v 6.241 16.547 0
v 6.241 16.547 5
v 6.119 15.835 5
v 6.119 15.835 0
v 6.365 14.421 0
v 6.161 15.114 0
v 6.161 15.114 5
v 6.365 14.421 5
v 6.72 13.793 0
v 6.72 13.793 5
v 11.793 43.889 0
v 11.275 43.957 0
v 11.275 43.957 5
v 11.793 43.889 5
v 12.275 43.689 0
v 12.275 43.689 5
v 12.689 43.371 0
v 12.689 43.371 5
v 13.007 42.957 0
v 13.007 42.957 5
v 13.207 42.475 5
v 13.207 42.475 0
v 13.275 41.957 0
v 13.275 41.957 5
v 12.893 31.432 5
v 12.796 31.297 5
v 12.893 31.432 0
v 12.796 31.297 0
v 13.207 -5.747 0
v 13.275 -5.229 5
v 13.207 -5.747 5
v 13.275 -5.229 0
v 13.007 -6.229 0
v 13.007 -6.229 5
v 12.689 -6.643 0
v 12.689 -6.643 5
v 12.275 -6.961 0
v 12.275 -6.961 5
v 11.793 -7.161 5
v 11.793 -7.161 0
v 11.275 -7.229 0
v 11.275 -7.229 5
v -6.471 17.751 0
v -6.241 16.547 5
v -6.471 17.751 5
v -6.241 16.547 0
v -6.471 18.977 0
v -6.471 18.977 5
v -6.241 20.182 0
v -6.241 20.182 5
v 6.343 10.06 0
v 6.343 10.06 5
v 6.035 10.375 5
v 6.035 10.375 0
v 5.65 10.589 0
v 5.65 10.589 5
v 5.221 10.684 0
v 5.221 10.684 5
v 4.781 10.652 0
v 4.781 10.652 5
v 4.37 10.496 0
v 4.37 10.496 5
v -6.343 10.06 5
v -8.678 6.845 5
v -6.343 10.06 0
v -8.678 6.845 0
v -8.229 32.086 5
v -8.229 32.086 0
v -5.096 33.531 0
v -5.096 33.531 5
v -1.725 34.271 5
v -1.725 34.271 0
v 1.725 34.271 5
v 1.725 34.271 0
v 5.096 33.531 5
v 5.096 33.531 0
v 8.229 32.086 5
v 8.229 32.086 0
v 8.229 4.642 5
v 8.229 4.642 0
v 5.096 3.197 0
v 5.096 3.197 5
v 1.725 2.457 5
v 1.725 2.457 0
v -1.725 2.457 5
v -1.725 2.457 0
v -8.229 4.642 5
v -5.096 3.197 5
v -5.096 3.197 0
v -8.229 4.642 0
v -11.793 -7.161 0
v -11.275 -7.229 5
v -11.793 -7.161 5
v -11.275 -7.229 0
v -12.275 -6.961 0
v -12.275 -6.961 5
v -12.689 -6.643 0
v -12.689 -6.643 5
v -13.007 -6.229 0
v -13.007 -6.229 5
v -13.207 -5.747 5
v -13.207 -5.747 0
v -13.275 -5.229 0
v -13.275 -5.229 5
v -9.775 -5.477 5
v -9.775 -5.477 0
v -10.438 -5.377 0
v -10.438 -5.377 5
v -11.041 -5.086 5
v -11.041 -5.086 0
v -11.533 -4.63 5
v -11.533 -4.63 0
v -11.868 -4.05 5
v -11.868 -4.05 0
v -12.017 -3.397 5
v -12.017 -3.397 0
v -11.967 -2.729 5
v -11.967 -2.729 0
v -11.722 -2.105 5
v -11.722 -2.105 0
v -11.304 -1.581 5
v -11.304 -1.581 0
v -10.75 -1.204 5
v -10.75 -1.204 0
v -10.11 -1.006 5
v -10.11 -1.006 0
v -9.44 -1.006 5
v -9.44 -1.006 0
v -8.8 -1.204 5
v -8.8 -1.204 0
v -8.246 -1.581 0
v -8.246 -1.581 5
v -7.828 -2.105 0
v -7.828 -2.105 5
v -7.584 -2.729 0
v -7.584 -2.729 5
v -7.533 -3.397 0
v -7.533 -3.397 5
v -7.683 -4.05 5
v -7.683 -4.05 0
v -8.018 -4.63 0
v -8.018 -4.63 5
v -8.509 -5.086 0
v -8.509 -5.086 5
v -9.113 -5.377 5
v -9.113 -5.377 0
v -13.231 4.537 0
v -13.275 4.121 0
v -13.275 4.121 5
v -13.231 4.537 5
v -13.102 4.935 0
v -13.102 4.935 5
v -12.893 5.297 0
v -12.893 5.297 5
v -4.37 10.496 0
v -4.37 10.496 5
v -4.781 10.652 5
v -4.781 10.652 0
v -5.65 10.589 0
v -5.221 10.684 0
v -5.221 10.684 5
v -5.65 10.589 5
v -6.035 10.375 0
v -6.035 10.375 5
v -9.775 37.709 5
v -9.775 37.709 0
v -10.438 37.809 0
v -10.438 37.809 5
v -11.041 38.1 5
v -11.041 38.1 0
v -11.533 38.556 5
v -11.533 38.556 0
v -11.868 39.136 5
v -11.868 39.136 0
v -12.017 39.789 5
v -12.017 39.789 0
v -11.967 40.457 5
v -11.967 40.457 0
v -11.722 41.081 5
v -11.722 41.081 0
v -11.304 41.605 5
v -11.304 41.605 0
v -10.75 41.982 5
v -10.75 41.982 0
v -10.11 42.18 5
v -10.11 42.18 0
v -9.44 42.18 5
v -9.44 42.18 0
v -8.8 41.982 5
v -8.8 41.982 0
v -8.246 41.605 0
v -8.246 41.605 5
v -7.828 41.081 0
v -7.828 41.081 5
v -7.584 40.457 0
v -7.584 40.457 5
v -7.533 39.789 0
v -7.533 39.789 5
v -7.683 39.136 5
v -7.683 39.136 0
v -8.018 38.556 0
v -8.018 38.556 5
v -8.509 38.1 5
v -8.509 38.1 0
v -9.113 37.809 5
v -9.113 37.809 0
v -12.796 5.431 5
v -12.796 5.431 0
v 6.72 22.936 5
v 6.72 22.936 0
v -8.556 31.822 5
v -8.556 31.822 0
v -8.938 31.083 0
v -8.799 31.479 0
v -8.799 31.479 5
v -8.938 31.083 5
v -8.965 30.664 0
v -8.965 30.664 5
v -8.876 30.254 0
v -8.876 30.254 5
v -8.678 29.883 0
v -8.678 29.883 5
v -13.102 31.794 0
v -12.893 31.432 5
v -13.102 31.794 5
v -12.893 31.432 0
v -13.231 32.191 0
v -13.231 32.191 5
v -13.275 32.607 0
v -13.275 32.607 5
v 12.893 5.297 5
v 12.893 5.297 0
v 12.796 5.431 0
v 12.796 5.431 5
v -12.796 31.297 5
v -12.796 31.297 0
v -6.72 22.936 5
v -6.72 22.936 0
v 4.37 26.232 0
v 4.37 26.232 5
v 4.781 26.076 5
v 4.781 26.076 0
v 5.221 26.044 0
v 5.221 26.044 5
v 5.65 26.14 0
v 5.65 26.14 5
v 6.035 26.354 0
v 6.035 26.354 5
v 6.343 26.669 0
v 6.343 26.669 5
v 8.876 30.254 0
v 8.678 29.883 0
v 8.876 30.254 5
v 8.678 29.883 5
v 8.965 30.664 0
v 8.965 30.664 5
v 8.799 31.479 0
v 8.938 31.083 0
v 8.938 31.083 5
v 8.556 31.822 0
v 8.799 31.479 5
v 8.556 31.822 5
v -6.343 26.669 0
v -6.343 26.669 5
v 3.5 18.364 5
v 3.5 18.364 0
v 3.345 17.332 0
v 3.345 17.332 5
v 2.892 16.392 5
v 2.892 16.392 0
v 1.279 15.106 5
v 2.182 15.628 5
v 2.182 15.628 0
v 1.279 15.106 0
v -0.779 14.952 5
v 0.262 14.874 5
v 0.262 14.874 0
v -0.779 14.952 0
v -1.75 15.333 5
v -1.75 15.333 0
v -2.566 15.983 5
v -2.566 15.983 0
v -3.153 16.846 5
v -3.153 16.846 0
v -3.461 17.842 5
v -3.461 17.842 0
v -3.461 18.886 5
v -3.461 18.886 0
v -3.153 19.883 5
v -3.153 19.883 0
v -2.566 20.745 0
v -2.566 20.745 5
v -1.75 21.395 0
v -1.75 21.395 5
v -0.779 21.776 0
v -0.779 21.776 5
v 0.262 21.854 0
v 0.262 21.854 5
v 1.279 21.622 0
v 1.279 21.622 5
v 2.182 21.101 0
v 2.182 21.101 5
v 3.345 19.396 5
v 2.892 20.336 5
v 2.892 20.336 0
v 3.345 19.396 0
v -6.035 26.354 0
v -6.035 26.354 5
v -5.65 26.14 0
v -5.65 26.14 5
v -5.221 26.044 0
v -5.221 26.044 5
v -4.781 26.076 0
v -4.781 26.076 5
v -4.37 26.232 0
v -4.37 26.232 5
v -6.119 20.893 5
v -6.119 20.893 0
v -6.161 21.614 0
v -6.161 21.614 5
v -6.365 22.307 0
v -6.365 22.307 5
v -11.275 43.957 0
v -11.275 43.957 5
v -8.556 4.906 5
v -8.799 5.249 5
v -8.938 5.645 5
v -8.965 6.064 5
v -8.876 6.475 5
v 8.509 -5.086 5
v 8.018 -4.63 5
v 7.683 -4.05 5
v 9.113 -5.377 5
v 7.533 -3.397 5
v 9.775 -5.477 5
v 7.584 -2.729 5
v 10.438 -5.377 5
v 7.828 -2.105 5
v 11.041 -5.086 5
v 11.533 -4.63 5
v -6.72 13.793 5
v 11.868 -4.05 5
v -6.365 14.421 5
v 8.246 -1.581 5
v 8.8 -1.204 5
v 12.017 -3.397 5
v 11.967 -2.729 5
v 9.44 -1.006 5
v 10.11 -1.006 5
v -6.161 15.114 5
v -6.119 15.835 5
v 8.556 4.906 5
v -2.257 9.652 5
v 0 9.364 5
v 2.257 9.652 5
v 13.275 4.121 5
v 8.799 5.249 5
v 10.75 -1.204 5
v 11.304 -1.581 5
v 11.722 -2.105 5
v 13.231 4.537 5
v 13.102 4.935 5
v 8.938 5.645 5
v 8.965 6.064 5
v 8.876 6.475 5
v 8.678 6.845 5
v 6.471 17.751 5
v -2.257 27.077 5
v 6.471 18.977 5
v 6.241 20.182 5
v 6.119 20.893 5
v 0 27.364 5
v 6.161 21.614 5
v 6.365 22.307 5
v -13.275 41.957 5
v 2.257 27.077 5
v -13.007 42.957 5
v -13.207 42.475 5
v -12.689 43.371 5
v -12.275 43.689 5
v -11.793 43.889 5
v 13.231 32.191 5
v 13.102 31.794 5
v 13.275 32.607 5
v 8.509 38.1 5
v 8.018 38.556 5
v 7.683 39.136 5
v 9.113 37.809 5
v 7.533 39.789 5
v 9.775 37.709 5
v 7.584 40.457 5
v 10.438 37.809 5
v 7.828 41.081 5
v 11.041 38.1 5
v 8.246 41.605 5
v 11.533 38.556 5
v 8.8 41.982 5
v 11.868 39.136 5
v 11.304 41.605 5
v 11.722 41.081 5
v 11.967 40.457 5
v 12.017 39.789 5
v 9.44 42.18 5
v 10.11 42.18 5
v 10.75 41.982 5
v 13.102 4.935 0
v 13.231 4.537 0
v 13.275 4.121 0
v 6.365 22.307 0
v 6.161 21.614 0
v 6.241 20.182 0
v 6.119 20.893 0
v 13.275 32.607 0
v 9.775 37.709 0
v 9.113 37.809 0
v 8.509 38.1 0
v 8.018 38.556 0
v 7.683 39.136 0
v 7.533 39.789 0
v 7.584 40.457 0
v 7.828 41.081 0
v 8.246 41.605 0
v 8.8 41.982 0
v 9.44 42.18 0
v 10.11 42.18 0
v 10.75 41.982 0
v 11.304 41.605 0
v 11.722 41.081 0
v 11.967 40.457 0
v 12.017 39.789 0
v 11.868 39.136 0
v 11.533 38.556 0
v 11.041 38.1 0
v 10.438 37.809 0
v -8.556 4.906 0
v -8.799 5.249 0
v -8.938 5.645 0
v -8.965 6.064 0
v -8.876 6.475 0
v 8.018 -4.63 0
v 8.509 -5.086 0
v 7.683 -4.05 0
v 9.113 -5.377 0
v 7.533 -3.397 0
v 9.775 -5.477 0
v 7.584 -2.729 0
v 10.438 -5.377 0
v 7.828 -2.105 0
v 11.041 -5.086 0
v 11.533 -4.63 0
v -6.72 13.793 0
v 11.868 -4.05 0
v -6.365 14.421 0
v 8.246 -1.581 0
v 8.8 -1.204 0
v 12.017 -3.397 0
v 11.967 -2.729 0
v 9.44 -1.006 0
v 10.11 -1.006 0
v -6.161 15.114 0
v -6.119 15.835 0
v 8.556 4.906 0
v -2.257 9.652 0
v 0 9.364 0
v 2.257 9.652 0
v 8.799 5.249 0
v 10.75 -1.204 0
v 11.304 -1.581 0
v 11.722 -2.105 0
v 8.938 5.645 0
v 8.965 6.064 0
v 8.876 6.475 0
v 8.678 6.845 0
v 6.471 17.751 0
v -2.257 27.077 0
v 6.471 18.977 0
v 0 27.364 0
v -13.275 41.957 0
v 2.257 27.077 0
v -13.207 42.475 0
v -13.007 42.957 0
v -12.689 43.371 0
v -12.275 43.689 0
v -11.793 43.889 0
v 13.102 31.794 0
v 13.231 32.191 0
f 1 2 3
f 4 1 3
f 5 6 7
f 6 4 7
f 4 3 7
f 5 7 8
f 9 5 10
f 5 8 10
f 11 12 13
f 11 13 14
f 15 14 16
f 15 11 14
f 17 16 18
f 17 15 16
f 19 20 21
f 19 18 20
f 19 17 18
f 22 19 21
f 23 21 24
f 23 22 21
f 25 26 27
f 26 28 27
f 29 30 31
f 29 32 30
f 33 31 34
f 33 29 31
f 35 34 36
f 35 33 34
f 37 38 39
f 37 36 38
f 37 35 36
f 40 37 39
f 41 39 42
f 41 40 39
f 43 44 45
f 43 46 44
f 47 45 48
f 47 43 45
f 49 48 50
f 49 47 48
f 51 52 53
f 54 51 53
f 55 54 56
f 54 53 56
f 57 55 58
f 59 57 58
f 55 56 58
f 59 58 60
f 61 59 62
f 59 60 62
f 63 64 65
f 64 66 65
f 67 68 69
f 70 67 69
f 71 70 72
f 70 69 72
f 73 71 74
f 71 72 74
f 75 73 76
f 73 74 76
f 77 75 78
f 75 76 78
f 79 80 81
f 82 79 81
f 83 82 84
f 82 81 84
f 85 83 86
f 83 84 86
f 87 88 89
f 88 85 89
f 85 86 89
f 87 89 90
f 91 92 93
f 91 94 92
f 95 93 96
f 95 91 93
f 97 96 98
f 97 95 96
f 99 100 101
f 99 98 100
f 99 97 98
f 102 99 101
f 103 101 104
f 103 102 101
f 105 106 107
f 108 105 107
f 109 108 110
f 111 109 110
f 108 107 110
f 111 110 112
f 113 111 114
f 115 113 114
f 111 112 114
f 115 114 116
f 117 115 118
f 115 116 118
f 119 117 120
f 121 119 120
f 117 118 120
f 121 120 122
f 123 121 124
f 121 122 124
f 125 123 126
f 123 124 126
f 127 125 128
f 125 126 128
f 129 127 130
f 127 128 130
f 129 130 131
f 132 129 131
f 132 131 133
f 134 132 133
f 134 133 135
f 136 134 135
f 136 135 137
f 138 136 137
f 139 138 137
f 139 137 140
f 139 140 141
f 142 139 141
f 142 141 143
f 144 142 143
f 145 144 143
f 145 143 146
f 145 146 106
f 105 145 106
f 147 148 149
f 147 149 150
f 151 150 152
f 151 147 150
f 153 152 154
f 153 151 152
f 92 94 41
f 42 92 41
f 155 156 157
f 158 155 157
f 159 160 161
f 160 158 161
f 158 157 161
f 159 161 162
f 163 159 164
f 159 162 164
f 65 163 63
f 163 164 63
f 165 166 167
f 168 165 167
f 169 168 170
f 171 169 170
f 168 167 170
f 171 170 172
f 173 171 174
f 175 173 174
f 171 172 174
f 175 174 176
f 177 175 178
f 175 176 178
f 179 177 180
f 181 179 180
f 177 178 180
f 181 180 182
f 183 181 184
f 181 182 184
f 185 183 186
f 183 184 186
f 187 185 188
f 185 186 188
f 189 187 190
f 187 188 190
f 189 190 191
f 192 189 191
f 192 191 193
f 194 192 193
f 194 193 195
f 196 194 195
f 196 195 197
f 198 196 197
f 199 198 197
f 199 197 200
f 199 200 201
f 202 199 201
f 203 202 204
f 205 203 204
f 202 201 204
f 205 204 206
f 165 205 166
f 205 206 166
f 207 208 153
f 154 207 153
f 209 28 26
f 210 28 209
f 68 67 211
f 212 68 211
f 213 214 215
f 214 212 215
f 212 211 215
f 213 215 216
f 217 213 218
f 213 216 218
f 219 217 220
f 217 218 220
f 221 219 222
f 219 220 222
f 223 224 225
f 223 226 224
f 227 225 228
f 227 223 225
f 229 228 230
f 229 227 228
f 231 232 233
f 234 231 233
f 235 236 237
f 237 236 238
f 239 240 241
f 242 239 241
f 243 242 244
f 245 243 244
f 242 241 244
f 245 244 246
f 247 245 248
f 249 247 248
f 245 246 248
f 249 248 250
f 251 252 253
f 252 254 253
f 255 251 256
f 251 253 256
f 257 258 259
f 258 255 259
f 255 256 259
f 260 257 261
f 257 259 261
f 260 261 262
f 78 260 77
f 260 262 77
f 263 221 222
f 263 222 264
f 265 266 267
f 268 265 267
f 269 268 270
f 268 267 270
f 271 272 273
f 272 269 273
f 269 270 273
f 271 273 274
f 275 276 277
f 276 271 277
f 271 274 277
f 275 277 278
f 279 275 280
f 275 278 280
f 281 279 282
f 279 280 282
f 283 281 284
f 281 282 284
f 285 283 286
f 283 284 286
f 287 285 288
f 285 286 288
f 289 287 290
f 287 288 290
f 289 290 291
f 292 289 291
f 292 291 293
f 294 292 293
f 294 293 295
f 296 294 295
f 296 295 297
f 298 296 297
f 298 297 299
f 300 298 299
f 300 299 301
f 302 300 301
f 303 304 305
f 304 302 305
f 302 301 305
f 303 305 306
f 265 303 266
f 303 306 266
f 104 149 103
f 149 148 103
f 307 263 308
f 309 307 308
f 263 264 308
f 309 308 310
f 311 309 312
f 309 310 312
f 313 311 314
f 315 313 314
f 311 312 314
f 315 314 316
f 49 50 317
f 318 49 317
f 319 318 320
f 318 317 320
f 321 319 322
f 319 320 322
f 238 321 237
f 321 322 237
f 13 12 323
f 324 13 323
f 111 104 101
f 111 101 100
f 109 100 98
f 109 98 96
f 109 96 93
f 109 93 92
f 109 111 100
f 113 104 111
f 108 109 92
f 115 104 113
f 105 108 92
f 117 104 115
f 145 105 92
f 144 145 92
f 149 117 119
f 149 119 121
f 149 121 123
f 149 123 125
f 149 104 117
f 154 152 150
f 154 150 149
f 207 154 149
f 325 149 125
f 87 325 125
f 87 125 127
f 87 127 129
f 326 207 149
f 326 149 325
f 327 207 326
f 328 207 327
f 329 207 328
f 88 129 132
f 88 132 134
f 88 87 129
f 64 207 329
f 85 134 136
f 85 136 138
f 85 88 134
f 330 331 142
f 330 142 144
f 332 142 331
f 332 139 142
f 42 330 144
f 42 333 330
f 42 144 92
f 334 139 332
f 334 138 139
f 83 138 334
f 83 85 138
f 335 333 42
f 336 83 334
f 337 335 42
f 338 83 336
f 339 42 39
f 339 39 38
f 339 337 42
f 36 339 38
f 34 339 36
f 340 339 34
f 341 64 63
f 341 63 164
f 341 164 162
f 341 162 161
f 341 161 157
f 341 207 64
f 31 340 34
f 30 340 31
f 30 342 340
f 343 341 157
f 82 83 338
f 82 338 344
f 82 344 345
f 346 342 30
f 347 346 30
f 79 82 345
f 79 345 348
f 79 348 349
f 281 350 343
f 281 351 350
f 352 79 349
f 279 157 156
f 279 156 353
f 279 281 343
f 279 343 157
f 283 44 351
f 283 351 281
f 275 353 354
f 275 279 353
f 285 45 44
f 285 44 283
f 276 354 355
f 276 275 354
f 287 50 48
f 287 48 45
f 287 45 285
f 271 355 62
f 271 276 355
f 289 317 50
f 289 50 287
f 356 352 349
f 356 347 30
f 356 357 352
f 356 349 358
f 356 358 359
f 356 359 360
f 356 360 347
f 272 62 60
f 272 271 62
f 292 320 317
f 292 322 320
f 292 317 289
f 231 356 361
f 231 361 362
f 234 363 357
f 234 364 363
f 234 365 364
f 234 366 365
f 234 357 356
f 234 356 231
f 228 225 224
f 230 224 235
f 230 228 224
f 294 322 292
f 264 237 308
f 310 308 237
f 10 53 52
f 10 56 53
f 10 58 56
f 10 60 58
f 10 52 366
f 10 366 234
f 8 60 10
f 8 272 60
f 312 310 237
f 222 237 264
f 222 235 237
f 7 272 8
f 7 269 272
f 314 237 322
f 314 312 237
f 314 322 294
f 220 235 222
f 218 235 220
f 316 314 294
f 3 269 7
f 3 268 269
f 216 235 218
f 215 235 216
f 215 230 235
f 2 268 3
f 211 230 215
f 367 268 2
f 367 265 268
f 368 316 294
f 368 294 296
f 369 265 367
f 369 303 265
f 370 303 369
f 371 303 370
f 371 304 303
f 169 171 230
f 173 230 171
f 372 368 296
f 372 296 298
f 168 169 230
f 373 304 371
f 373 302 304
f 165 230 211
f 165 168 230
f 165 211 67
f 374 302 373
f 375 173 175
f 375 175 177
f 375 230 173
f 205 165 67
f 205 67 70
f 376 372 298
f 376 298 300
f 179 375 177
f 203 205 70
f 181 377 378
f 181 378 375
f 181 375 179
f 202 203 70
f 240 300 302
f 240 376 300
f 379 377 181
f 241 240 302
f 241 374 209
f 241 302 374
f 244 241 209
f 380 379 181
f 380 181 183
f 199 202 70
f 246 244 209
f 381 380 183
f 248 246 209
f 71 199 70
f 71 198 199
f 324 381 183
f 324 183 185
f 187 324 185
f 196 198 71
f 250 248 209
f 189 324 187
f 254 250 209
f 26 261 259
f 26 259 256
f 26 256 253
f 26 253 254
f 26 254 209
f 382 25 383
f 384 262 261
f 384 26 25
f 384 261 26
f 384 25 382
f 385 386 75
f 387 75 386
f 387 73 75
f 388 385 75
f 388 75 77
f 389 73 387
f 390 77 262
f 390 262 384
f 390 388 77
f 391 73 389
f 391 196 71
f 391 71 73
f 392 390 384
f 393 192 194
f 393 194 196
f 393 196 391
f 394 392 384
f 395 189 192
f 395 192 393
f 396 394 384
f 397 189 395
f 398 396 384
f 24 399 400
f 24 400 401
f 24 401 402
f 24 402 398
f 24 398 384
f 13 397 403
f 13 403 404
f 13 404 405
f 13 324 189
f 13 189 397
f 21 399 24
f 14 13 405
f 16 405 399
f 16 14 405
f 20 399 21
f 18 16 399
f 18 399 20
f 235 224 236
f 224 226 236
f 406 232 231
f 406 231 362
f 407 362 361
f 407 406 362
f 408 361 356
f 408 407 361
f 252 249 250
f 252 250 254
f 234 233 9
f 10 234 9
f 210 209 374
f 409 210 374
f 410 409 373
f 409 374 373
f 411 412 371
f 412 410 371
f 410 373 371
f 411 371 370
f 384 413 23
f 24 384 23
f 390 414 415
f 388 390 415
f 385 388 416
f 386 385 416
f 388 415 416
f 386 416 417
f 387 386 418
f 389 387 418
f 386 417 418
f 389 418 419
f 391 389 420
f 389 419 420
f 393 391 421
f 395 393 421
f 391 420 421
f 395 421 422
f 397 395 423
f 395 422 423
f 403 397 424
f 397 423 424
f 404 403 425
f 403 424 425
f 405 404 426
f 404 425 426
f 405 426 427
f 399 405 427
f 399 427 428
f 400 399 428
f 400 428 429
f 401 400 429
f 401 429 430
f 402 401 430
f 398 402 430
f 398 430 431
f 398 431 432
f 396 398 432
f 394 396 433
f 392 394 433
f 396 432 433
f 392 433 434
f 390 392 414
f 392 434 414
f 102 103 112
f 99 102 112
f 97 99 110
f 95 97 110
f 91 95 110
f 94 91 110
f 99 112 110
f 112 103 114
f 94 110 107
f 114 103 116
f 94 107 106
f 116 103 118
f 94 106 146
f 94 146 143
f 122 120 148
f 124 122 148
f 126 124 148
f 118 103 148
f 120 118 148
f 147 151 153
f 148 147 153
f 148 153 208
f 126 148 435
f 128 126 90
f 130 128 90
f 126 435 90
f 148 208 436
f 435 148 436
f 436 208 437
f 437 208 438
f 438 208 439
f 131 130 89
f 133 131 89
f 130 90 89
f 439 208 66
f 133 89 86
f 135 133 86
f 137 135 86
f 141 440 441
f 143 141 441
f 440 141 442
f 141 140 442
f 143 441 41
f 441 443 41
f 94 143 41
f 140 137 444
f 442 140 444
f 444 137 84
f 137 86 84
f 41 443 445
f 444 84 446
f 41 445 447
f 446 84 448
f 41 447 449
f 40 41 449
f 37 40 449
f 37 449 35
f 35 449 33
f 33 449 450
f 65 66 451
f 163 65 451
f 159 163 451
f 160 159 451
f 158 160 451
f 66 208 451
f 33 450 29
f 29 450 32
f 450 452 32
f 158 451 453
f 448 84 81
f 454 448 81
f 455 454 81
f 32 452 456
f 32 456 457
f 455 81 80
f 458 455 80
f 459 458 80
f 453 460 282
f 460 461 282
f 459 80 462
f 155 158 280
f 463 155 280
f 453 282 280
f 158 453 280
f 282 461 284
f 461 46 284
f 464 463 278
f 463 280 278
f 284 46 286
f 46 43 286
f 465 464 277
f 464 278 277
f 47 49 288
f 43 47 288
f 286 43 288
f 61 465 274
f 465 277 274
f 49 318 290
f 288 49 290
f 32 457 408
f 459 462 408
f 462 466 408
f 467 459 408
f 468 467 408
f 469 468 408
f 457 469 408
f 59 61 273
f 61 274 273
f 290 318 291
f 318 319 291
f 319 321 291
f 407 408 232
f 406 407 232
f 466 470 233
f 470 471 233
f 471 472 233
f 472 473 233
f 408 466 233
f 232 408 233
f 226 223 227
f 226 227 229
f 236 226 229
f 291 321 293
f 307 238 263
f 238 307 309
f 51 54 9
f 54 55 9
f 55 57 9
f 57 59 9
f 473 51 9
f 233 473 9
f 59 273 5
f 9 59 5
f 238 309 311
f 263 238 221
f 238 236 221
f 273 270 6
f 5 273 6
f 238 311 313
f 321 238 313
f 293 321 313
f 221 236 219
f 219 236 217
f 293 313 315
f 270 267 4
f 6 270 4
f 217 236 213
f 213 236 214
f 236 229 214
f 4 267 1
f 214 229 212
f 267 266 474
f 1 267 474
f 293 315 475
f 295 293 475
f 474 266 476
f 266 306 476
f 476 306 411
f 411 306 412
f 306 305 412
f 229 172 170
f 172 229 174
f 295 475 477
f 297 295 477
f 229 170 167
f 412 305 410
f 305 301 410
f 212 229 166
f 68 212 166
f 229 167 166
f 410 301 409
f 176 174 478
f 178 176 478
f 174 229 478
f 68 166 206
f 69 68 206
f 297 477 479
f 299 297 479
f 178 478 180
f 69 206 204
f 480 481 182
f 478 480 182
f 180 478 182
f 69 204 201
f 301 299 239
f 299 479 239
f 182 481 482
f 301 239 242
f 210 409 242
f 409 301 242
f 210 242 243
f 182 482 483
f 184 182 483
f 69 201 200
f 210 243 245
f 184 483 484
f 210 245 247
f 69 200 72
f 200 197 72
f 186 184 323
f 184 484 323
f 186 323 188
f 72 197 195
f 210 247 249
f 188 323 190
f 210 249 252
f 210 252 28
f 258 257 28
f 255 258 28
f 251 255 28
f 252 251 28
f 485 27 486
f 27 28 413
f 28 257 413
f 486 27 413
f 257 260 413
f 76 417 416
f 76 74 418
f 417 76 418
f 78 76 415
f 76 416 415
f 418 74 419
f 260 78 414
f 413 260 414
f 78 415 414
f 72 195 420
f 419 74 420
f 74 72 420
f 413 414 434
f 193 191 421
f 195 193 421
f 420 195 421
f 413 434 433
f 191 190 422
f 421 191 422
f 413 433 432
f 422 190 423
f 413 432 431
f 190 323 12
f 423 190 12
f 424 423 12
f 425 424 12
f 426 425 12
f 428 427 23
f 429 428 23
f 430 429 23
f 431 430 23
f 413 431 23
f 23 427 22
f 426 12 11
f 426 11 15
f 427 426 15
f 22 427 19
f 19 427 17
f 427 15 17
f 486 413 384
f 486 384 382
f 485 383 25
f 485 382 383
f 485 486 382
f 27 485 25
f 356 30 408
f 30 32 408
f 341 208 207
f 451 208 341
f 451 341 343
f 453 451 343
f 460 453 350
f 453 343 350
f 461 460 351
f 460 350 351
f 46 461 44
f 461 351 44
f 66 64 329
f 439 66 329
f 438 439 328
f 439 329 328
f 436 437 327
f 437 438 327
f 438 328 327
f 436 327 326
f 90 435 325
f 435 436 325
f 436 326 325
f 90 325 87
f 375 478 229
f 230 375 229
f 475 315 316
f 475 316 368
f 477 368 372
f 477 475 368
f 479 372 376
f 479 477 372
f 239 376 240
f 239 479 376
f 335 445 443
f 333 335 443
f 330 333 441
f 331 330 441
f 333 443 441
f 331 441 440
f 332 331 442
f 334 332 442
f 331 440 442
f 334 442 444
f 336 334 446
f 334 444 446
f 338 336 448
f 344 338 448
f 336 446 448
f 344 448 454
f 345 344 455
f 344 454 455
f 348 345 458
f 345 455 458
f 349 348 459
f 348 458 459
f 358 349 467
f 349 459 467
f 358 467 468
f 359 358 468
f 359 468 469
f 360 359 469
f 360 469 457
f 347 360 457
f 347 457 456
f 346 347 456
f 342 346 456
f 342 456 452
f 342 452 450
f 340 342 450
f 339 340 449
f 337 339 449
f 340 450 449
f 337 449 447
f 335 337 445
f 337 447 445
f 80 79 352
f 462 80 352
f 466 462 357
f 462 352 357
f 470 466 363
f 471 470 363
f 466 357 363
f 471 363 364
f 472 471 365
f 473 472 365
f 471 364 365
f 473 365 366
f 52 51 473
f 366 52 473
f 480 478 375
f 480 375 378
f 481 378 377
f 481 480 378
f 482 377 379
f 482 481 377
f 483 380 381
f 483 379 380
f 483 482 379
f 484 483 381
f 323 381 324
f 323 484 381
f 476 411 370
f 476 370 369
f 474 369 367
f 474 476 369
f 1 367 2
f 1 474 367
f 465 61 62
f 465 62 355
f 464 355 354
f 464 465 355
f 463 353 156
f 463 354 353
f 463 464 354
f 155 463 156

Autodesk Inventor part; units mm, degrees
ref_plane "YZ Plane" through (0, 0, 0) normal (1, 0, 0) x (0, 1, 0)
ref_plane "XZ Plane" through (0, 0, 0) normal (0, 1, 0) x (-1, 0, 0)
ref_plane "XY Plane" through (0, 0, 0) normal (0, 0, 1) x (1, 0, 0)
sketch "Sketch1" plane through (0, 0, 0) normal (0, 0, 1) x (1, 0, 0)
  circle A0 centre (9.7751, -3.2289) radius 1.621 projected
  circle A1 centre (-9.7751, -3.2289) radius 1.621 projected
  line L0 (-11.2751, -7.2289) -> (11.2751, -7.2289) projected
  line L1 (13.2751, -5.2289) -> (13.2751, 4.1213) projected
  line L2 (12.8932, 5.2968) -> (12.7957, 5.4309) projected
  line L3 (-12.7957, 5.4309) -> (-12.8932, 5.2968) projected
  line L4 (-13.2751, 4.1213) -> (-13.2751, -5.2289) projected
  circle A2 centre (-9.7751, 39.9572) radius 1.621 projected
  circle A3 centre (9.7751, 39.9572) radius 1.621 projected
  line L5 (11.2751, 43.9572) -> (-11.2751, 43.9572) projected
  line L6 (-13.2751, 41.9572) -> (-13.2751, 32.607) projected
  line L7 (-12.8932, 31.4315) -> (-12.7957, 31.2974) projected
  line L8 (12.7957, 31.2974) -> (12.8932, 31.4315) projected
  line L9 (13.2751, 32.607) -> (13.2751, 41.9572) projected
  line L10 (13.2751, -7.2289) -> (-13.2751, -7.2289)
  line L11 (-13.2751, -7.2289) -> (-13.2751, 43.9572)
  line L12 (-13.2751, 43.9572) -> (13.2751, 43.9572)
  line L13 (13.2751, 43.9572) -> (13.2751, -7.2289)
  circle A4 centre (0, 18.3641) radius 3.5
  circle A5 centre (0, 18.3641) radius 6.5
  line L14 (13.2751, 31.9572) -> (5.6866, 21.5125)
  line L15 (13.2751, 4.7711) -> (5.6866, 15.2158)
  line L16 (-13.2751, 4.7711) -> (-5.6866, 15.2158)
  line L17 (-13.2751, 31.9572) -> (-5.6866, 21.5125)
  arc A6 (-11.4894, 7.2289) -> (11.4894, 7.2289) centre (0, 18.3641) ccw
  arc A7 (11.4894, 29.4994) -> (-11.4894, 29.4994) centre (0, 18.3641) ccw
  line L18 (5.6866, 15.2158) -> (11.4894, 7.2289)
  line L19 (-5.6866, 15.2158) -> (-11.4894, 7.2289)
  arc A8 (-5.6866, 15.2158) -> (5.6866, 15.2158) centre (0, 18.3641) ccw
  line L20 (5.4903, 11.2327) -> (9.6057, 5.5684)
  arc A9 (-5.4903, 11.2327) -> (5.4903, 11.2327) centre (0, 18.3641) ccw
  line L21 (-9.6057, 5.5684) -> (-5.4903, 11.2327)
  line L22 (0, 18.3641) -> (-13.2751, 18.3641) construction
  circle A10 centre (0, 18.3641) radius 6.5 construction
  arc A11 (5.6866, 21.5125) -> (-5.6866, 21.5125) centre (0, 18.3641) ccw
  line L23 (5.4903, 25.4955) -> (9.6057, 31.1599)
  arc A12 (5.4903, 25.4955) -> (-5.4903, 25.4955) centre (0, 18.3641) ccw
  line L24 (-9.6057, 31.1599) -> (-4.02, 23.4719)
  arc A13 (-13.2751, 32.607) -> (-12.8932, 31.4315) centre (-11.2751, 32.607) ccw projected
  arc A14 (-12.7957, 31.2974) -> (-12.6739, 31.1458) centre (-11.1777, 32.473) ccw projected
  arc A15 (12.6739, 31.1458) -> (-12.6739, 31.1458) centre (0, 18.3641) ccw projected
  arc A16 (12.6739, 31.1458) -> (12.7957, 31.2974) centre (11.1777, 32.473) ccw projected
  arc A17 (12.8932, 31.4315) -> (13.2751, 32.607) centre (11.2751, 32.607) ccw projected
  arc A18 (13.2751, 41.9572) -> (11.2751, 43.9572) centre (11.2751, 41.9572) ccw projected
  arc A19 (-11.2751, 43.9572) -> (-13.2751, 41.9572) centre (-11.2751, 41.9572) ccw projected
  arc A20 (13.2751, 4.1213) -> (12.8932, 5.2968) centre (11.2751, 4.1213) ccw projected
  arc A21 (12.7957, 5.4309) -> (12.6739, 5.5825) centre (11.1777, 4.2553) ccw projected
  arc A22 (-12.6739, 5.5825) -> (12.6739, 5.5825) centre (0, 18.3641) ccw projected
  arc A23 (-12.6739, 5.5825) -> (-12.7957, 5.4309) centre (-11.1777, 4.2553) ccw projected
  arc A24 (-12.8932, 5.2968) -> (-13.2751, 4.1213) centre (-11.2751, 4.1213) ccw projected
  arc A25 (-13.2751, -5.2289) -> (-11.2751, -7.2289) centre (-11.2751, -5.2289) ccw projected
  arc A26 (11.2751, -7.2289) -> (13.2751, -5.2289) centre (11.2751, -5.2289) ccw projected
  point P0 (0, 0)
  point P1 (8.136, 7.5912)
  point P2 (-8.136, 7.5912)
  point P3 (8.136, 29.1371)
  point P4 (-8.136, 29.1371)
  dimension "d0" = 7
  dimension "d1" = 13
  dimension "d4" = 2.5
  dimension "d5" = 2.5
  dimension "d6" = 2.5
extrude "Extrusion1" add sketch "Sketch1" along normal blind 5 contours A25 L4 A24 L3 A23 A22 A21 L2 A20 L1 A26 L0 | L16 A6 L15 A21 A22 A23 | L6 A19 L5 A18 L9 A17 L8 A16 A15 A14 L7 A13 | L16 A5 L15 A6 L20 A9 L21 | A14 A15 A16 L14 A7 L17 | A5 | A7 L24 A5 L17 | L14 A5 L24 A12 L23 A7
fillet "Fillet1" radius 3.175 4 edges at (5.6866, 15.2158, 2.5) (5.6866, 21.5125, 2.5) (-5.6866, 15.2158, 2.5) (-5.6866, 21.5125, 2.5)
sketch "Sketch2" plane through (0, 0, 5) normal (0, 0, 1) x (1, 0, 0)
  circle A0 centre (9.7751, -3.2289) radius 1.621 projected
  circle A1 centre (-9.7751, -3.2289) radius 1.621 projected
  circle A2 centre (9.7751, 39.9572) radius 1.621 projected
  circle A3 centre (-9.7751, 39.9572) radius 1.621 projected
  circle A4 centre (9.7751, -3.2289) radius 1.621 projected
  circle A5 centre (-9.7751, -3.2289) radius 1.621 projected
  point P0 (0, 0)
hole "Hole1" at (9.7751, -3.2289, 5) at (-9.7751, -3.2289, 5) at (-9.7751, 39.9572, 5) at (9.7751, 39.9572, 5) direction (0, 0, -1) diameter 4.4958 end through all clearance for "Flat Head Machine Screw" size "M4" standard "Ansi Metric M Profile"
fillet "Fillet2" radius 1.524 8 edges at (-9.6057, 31.1599, 2.5) (-5.4903, 25.4955, 2.5) (5.4903, 25.4955, 2.5) (9.6057, 31.1599, 2.5) (-9.6057, 5.5684, 2.5) (-5.4903, 11.2327, 2.5) (5.4903, 11.2327, 2.5) (9.6057, 5.5684, 2.5)
properties part number "2104_Tx_CoilBackPlate_V1"
